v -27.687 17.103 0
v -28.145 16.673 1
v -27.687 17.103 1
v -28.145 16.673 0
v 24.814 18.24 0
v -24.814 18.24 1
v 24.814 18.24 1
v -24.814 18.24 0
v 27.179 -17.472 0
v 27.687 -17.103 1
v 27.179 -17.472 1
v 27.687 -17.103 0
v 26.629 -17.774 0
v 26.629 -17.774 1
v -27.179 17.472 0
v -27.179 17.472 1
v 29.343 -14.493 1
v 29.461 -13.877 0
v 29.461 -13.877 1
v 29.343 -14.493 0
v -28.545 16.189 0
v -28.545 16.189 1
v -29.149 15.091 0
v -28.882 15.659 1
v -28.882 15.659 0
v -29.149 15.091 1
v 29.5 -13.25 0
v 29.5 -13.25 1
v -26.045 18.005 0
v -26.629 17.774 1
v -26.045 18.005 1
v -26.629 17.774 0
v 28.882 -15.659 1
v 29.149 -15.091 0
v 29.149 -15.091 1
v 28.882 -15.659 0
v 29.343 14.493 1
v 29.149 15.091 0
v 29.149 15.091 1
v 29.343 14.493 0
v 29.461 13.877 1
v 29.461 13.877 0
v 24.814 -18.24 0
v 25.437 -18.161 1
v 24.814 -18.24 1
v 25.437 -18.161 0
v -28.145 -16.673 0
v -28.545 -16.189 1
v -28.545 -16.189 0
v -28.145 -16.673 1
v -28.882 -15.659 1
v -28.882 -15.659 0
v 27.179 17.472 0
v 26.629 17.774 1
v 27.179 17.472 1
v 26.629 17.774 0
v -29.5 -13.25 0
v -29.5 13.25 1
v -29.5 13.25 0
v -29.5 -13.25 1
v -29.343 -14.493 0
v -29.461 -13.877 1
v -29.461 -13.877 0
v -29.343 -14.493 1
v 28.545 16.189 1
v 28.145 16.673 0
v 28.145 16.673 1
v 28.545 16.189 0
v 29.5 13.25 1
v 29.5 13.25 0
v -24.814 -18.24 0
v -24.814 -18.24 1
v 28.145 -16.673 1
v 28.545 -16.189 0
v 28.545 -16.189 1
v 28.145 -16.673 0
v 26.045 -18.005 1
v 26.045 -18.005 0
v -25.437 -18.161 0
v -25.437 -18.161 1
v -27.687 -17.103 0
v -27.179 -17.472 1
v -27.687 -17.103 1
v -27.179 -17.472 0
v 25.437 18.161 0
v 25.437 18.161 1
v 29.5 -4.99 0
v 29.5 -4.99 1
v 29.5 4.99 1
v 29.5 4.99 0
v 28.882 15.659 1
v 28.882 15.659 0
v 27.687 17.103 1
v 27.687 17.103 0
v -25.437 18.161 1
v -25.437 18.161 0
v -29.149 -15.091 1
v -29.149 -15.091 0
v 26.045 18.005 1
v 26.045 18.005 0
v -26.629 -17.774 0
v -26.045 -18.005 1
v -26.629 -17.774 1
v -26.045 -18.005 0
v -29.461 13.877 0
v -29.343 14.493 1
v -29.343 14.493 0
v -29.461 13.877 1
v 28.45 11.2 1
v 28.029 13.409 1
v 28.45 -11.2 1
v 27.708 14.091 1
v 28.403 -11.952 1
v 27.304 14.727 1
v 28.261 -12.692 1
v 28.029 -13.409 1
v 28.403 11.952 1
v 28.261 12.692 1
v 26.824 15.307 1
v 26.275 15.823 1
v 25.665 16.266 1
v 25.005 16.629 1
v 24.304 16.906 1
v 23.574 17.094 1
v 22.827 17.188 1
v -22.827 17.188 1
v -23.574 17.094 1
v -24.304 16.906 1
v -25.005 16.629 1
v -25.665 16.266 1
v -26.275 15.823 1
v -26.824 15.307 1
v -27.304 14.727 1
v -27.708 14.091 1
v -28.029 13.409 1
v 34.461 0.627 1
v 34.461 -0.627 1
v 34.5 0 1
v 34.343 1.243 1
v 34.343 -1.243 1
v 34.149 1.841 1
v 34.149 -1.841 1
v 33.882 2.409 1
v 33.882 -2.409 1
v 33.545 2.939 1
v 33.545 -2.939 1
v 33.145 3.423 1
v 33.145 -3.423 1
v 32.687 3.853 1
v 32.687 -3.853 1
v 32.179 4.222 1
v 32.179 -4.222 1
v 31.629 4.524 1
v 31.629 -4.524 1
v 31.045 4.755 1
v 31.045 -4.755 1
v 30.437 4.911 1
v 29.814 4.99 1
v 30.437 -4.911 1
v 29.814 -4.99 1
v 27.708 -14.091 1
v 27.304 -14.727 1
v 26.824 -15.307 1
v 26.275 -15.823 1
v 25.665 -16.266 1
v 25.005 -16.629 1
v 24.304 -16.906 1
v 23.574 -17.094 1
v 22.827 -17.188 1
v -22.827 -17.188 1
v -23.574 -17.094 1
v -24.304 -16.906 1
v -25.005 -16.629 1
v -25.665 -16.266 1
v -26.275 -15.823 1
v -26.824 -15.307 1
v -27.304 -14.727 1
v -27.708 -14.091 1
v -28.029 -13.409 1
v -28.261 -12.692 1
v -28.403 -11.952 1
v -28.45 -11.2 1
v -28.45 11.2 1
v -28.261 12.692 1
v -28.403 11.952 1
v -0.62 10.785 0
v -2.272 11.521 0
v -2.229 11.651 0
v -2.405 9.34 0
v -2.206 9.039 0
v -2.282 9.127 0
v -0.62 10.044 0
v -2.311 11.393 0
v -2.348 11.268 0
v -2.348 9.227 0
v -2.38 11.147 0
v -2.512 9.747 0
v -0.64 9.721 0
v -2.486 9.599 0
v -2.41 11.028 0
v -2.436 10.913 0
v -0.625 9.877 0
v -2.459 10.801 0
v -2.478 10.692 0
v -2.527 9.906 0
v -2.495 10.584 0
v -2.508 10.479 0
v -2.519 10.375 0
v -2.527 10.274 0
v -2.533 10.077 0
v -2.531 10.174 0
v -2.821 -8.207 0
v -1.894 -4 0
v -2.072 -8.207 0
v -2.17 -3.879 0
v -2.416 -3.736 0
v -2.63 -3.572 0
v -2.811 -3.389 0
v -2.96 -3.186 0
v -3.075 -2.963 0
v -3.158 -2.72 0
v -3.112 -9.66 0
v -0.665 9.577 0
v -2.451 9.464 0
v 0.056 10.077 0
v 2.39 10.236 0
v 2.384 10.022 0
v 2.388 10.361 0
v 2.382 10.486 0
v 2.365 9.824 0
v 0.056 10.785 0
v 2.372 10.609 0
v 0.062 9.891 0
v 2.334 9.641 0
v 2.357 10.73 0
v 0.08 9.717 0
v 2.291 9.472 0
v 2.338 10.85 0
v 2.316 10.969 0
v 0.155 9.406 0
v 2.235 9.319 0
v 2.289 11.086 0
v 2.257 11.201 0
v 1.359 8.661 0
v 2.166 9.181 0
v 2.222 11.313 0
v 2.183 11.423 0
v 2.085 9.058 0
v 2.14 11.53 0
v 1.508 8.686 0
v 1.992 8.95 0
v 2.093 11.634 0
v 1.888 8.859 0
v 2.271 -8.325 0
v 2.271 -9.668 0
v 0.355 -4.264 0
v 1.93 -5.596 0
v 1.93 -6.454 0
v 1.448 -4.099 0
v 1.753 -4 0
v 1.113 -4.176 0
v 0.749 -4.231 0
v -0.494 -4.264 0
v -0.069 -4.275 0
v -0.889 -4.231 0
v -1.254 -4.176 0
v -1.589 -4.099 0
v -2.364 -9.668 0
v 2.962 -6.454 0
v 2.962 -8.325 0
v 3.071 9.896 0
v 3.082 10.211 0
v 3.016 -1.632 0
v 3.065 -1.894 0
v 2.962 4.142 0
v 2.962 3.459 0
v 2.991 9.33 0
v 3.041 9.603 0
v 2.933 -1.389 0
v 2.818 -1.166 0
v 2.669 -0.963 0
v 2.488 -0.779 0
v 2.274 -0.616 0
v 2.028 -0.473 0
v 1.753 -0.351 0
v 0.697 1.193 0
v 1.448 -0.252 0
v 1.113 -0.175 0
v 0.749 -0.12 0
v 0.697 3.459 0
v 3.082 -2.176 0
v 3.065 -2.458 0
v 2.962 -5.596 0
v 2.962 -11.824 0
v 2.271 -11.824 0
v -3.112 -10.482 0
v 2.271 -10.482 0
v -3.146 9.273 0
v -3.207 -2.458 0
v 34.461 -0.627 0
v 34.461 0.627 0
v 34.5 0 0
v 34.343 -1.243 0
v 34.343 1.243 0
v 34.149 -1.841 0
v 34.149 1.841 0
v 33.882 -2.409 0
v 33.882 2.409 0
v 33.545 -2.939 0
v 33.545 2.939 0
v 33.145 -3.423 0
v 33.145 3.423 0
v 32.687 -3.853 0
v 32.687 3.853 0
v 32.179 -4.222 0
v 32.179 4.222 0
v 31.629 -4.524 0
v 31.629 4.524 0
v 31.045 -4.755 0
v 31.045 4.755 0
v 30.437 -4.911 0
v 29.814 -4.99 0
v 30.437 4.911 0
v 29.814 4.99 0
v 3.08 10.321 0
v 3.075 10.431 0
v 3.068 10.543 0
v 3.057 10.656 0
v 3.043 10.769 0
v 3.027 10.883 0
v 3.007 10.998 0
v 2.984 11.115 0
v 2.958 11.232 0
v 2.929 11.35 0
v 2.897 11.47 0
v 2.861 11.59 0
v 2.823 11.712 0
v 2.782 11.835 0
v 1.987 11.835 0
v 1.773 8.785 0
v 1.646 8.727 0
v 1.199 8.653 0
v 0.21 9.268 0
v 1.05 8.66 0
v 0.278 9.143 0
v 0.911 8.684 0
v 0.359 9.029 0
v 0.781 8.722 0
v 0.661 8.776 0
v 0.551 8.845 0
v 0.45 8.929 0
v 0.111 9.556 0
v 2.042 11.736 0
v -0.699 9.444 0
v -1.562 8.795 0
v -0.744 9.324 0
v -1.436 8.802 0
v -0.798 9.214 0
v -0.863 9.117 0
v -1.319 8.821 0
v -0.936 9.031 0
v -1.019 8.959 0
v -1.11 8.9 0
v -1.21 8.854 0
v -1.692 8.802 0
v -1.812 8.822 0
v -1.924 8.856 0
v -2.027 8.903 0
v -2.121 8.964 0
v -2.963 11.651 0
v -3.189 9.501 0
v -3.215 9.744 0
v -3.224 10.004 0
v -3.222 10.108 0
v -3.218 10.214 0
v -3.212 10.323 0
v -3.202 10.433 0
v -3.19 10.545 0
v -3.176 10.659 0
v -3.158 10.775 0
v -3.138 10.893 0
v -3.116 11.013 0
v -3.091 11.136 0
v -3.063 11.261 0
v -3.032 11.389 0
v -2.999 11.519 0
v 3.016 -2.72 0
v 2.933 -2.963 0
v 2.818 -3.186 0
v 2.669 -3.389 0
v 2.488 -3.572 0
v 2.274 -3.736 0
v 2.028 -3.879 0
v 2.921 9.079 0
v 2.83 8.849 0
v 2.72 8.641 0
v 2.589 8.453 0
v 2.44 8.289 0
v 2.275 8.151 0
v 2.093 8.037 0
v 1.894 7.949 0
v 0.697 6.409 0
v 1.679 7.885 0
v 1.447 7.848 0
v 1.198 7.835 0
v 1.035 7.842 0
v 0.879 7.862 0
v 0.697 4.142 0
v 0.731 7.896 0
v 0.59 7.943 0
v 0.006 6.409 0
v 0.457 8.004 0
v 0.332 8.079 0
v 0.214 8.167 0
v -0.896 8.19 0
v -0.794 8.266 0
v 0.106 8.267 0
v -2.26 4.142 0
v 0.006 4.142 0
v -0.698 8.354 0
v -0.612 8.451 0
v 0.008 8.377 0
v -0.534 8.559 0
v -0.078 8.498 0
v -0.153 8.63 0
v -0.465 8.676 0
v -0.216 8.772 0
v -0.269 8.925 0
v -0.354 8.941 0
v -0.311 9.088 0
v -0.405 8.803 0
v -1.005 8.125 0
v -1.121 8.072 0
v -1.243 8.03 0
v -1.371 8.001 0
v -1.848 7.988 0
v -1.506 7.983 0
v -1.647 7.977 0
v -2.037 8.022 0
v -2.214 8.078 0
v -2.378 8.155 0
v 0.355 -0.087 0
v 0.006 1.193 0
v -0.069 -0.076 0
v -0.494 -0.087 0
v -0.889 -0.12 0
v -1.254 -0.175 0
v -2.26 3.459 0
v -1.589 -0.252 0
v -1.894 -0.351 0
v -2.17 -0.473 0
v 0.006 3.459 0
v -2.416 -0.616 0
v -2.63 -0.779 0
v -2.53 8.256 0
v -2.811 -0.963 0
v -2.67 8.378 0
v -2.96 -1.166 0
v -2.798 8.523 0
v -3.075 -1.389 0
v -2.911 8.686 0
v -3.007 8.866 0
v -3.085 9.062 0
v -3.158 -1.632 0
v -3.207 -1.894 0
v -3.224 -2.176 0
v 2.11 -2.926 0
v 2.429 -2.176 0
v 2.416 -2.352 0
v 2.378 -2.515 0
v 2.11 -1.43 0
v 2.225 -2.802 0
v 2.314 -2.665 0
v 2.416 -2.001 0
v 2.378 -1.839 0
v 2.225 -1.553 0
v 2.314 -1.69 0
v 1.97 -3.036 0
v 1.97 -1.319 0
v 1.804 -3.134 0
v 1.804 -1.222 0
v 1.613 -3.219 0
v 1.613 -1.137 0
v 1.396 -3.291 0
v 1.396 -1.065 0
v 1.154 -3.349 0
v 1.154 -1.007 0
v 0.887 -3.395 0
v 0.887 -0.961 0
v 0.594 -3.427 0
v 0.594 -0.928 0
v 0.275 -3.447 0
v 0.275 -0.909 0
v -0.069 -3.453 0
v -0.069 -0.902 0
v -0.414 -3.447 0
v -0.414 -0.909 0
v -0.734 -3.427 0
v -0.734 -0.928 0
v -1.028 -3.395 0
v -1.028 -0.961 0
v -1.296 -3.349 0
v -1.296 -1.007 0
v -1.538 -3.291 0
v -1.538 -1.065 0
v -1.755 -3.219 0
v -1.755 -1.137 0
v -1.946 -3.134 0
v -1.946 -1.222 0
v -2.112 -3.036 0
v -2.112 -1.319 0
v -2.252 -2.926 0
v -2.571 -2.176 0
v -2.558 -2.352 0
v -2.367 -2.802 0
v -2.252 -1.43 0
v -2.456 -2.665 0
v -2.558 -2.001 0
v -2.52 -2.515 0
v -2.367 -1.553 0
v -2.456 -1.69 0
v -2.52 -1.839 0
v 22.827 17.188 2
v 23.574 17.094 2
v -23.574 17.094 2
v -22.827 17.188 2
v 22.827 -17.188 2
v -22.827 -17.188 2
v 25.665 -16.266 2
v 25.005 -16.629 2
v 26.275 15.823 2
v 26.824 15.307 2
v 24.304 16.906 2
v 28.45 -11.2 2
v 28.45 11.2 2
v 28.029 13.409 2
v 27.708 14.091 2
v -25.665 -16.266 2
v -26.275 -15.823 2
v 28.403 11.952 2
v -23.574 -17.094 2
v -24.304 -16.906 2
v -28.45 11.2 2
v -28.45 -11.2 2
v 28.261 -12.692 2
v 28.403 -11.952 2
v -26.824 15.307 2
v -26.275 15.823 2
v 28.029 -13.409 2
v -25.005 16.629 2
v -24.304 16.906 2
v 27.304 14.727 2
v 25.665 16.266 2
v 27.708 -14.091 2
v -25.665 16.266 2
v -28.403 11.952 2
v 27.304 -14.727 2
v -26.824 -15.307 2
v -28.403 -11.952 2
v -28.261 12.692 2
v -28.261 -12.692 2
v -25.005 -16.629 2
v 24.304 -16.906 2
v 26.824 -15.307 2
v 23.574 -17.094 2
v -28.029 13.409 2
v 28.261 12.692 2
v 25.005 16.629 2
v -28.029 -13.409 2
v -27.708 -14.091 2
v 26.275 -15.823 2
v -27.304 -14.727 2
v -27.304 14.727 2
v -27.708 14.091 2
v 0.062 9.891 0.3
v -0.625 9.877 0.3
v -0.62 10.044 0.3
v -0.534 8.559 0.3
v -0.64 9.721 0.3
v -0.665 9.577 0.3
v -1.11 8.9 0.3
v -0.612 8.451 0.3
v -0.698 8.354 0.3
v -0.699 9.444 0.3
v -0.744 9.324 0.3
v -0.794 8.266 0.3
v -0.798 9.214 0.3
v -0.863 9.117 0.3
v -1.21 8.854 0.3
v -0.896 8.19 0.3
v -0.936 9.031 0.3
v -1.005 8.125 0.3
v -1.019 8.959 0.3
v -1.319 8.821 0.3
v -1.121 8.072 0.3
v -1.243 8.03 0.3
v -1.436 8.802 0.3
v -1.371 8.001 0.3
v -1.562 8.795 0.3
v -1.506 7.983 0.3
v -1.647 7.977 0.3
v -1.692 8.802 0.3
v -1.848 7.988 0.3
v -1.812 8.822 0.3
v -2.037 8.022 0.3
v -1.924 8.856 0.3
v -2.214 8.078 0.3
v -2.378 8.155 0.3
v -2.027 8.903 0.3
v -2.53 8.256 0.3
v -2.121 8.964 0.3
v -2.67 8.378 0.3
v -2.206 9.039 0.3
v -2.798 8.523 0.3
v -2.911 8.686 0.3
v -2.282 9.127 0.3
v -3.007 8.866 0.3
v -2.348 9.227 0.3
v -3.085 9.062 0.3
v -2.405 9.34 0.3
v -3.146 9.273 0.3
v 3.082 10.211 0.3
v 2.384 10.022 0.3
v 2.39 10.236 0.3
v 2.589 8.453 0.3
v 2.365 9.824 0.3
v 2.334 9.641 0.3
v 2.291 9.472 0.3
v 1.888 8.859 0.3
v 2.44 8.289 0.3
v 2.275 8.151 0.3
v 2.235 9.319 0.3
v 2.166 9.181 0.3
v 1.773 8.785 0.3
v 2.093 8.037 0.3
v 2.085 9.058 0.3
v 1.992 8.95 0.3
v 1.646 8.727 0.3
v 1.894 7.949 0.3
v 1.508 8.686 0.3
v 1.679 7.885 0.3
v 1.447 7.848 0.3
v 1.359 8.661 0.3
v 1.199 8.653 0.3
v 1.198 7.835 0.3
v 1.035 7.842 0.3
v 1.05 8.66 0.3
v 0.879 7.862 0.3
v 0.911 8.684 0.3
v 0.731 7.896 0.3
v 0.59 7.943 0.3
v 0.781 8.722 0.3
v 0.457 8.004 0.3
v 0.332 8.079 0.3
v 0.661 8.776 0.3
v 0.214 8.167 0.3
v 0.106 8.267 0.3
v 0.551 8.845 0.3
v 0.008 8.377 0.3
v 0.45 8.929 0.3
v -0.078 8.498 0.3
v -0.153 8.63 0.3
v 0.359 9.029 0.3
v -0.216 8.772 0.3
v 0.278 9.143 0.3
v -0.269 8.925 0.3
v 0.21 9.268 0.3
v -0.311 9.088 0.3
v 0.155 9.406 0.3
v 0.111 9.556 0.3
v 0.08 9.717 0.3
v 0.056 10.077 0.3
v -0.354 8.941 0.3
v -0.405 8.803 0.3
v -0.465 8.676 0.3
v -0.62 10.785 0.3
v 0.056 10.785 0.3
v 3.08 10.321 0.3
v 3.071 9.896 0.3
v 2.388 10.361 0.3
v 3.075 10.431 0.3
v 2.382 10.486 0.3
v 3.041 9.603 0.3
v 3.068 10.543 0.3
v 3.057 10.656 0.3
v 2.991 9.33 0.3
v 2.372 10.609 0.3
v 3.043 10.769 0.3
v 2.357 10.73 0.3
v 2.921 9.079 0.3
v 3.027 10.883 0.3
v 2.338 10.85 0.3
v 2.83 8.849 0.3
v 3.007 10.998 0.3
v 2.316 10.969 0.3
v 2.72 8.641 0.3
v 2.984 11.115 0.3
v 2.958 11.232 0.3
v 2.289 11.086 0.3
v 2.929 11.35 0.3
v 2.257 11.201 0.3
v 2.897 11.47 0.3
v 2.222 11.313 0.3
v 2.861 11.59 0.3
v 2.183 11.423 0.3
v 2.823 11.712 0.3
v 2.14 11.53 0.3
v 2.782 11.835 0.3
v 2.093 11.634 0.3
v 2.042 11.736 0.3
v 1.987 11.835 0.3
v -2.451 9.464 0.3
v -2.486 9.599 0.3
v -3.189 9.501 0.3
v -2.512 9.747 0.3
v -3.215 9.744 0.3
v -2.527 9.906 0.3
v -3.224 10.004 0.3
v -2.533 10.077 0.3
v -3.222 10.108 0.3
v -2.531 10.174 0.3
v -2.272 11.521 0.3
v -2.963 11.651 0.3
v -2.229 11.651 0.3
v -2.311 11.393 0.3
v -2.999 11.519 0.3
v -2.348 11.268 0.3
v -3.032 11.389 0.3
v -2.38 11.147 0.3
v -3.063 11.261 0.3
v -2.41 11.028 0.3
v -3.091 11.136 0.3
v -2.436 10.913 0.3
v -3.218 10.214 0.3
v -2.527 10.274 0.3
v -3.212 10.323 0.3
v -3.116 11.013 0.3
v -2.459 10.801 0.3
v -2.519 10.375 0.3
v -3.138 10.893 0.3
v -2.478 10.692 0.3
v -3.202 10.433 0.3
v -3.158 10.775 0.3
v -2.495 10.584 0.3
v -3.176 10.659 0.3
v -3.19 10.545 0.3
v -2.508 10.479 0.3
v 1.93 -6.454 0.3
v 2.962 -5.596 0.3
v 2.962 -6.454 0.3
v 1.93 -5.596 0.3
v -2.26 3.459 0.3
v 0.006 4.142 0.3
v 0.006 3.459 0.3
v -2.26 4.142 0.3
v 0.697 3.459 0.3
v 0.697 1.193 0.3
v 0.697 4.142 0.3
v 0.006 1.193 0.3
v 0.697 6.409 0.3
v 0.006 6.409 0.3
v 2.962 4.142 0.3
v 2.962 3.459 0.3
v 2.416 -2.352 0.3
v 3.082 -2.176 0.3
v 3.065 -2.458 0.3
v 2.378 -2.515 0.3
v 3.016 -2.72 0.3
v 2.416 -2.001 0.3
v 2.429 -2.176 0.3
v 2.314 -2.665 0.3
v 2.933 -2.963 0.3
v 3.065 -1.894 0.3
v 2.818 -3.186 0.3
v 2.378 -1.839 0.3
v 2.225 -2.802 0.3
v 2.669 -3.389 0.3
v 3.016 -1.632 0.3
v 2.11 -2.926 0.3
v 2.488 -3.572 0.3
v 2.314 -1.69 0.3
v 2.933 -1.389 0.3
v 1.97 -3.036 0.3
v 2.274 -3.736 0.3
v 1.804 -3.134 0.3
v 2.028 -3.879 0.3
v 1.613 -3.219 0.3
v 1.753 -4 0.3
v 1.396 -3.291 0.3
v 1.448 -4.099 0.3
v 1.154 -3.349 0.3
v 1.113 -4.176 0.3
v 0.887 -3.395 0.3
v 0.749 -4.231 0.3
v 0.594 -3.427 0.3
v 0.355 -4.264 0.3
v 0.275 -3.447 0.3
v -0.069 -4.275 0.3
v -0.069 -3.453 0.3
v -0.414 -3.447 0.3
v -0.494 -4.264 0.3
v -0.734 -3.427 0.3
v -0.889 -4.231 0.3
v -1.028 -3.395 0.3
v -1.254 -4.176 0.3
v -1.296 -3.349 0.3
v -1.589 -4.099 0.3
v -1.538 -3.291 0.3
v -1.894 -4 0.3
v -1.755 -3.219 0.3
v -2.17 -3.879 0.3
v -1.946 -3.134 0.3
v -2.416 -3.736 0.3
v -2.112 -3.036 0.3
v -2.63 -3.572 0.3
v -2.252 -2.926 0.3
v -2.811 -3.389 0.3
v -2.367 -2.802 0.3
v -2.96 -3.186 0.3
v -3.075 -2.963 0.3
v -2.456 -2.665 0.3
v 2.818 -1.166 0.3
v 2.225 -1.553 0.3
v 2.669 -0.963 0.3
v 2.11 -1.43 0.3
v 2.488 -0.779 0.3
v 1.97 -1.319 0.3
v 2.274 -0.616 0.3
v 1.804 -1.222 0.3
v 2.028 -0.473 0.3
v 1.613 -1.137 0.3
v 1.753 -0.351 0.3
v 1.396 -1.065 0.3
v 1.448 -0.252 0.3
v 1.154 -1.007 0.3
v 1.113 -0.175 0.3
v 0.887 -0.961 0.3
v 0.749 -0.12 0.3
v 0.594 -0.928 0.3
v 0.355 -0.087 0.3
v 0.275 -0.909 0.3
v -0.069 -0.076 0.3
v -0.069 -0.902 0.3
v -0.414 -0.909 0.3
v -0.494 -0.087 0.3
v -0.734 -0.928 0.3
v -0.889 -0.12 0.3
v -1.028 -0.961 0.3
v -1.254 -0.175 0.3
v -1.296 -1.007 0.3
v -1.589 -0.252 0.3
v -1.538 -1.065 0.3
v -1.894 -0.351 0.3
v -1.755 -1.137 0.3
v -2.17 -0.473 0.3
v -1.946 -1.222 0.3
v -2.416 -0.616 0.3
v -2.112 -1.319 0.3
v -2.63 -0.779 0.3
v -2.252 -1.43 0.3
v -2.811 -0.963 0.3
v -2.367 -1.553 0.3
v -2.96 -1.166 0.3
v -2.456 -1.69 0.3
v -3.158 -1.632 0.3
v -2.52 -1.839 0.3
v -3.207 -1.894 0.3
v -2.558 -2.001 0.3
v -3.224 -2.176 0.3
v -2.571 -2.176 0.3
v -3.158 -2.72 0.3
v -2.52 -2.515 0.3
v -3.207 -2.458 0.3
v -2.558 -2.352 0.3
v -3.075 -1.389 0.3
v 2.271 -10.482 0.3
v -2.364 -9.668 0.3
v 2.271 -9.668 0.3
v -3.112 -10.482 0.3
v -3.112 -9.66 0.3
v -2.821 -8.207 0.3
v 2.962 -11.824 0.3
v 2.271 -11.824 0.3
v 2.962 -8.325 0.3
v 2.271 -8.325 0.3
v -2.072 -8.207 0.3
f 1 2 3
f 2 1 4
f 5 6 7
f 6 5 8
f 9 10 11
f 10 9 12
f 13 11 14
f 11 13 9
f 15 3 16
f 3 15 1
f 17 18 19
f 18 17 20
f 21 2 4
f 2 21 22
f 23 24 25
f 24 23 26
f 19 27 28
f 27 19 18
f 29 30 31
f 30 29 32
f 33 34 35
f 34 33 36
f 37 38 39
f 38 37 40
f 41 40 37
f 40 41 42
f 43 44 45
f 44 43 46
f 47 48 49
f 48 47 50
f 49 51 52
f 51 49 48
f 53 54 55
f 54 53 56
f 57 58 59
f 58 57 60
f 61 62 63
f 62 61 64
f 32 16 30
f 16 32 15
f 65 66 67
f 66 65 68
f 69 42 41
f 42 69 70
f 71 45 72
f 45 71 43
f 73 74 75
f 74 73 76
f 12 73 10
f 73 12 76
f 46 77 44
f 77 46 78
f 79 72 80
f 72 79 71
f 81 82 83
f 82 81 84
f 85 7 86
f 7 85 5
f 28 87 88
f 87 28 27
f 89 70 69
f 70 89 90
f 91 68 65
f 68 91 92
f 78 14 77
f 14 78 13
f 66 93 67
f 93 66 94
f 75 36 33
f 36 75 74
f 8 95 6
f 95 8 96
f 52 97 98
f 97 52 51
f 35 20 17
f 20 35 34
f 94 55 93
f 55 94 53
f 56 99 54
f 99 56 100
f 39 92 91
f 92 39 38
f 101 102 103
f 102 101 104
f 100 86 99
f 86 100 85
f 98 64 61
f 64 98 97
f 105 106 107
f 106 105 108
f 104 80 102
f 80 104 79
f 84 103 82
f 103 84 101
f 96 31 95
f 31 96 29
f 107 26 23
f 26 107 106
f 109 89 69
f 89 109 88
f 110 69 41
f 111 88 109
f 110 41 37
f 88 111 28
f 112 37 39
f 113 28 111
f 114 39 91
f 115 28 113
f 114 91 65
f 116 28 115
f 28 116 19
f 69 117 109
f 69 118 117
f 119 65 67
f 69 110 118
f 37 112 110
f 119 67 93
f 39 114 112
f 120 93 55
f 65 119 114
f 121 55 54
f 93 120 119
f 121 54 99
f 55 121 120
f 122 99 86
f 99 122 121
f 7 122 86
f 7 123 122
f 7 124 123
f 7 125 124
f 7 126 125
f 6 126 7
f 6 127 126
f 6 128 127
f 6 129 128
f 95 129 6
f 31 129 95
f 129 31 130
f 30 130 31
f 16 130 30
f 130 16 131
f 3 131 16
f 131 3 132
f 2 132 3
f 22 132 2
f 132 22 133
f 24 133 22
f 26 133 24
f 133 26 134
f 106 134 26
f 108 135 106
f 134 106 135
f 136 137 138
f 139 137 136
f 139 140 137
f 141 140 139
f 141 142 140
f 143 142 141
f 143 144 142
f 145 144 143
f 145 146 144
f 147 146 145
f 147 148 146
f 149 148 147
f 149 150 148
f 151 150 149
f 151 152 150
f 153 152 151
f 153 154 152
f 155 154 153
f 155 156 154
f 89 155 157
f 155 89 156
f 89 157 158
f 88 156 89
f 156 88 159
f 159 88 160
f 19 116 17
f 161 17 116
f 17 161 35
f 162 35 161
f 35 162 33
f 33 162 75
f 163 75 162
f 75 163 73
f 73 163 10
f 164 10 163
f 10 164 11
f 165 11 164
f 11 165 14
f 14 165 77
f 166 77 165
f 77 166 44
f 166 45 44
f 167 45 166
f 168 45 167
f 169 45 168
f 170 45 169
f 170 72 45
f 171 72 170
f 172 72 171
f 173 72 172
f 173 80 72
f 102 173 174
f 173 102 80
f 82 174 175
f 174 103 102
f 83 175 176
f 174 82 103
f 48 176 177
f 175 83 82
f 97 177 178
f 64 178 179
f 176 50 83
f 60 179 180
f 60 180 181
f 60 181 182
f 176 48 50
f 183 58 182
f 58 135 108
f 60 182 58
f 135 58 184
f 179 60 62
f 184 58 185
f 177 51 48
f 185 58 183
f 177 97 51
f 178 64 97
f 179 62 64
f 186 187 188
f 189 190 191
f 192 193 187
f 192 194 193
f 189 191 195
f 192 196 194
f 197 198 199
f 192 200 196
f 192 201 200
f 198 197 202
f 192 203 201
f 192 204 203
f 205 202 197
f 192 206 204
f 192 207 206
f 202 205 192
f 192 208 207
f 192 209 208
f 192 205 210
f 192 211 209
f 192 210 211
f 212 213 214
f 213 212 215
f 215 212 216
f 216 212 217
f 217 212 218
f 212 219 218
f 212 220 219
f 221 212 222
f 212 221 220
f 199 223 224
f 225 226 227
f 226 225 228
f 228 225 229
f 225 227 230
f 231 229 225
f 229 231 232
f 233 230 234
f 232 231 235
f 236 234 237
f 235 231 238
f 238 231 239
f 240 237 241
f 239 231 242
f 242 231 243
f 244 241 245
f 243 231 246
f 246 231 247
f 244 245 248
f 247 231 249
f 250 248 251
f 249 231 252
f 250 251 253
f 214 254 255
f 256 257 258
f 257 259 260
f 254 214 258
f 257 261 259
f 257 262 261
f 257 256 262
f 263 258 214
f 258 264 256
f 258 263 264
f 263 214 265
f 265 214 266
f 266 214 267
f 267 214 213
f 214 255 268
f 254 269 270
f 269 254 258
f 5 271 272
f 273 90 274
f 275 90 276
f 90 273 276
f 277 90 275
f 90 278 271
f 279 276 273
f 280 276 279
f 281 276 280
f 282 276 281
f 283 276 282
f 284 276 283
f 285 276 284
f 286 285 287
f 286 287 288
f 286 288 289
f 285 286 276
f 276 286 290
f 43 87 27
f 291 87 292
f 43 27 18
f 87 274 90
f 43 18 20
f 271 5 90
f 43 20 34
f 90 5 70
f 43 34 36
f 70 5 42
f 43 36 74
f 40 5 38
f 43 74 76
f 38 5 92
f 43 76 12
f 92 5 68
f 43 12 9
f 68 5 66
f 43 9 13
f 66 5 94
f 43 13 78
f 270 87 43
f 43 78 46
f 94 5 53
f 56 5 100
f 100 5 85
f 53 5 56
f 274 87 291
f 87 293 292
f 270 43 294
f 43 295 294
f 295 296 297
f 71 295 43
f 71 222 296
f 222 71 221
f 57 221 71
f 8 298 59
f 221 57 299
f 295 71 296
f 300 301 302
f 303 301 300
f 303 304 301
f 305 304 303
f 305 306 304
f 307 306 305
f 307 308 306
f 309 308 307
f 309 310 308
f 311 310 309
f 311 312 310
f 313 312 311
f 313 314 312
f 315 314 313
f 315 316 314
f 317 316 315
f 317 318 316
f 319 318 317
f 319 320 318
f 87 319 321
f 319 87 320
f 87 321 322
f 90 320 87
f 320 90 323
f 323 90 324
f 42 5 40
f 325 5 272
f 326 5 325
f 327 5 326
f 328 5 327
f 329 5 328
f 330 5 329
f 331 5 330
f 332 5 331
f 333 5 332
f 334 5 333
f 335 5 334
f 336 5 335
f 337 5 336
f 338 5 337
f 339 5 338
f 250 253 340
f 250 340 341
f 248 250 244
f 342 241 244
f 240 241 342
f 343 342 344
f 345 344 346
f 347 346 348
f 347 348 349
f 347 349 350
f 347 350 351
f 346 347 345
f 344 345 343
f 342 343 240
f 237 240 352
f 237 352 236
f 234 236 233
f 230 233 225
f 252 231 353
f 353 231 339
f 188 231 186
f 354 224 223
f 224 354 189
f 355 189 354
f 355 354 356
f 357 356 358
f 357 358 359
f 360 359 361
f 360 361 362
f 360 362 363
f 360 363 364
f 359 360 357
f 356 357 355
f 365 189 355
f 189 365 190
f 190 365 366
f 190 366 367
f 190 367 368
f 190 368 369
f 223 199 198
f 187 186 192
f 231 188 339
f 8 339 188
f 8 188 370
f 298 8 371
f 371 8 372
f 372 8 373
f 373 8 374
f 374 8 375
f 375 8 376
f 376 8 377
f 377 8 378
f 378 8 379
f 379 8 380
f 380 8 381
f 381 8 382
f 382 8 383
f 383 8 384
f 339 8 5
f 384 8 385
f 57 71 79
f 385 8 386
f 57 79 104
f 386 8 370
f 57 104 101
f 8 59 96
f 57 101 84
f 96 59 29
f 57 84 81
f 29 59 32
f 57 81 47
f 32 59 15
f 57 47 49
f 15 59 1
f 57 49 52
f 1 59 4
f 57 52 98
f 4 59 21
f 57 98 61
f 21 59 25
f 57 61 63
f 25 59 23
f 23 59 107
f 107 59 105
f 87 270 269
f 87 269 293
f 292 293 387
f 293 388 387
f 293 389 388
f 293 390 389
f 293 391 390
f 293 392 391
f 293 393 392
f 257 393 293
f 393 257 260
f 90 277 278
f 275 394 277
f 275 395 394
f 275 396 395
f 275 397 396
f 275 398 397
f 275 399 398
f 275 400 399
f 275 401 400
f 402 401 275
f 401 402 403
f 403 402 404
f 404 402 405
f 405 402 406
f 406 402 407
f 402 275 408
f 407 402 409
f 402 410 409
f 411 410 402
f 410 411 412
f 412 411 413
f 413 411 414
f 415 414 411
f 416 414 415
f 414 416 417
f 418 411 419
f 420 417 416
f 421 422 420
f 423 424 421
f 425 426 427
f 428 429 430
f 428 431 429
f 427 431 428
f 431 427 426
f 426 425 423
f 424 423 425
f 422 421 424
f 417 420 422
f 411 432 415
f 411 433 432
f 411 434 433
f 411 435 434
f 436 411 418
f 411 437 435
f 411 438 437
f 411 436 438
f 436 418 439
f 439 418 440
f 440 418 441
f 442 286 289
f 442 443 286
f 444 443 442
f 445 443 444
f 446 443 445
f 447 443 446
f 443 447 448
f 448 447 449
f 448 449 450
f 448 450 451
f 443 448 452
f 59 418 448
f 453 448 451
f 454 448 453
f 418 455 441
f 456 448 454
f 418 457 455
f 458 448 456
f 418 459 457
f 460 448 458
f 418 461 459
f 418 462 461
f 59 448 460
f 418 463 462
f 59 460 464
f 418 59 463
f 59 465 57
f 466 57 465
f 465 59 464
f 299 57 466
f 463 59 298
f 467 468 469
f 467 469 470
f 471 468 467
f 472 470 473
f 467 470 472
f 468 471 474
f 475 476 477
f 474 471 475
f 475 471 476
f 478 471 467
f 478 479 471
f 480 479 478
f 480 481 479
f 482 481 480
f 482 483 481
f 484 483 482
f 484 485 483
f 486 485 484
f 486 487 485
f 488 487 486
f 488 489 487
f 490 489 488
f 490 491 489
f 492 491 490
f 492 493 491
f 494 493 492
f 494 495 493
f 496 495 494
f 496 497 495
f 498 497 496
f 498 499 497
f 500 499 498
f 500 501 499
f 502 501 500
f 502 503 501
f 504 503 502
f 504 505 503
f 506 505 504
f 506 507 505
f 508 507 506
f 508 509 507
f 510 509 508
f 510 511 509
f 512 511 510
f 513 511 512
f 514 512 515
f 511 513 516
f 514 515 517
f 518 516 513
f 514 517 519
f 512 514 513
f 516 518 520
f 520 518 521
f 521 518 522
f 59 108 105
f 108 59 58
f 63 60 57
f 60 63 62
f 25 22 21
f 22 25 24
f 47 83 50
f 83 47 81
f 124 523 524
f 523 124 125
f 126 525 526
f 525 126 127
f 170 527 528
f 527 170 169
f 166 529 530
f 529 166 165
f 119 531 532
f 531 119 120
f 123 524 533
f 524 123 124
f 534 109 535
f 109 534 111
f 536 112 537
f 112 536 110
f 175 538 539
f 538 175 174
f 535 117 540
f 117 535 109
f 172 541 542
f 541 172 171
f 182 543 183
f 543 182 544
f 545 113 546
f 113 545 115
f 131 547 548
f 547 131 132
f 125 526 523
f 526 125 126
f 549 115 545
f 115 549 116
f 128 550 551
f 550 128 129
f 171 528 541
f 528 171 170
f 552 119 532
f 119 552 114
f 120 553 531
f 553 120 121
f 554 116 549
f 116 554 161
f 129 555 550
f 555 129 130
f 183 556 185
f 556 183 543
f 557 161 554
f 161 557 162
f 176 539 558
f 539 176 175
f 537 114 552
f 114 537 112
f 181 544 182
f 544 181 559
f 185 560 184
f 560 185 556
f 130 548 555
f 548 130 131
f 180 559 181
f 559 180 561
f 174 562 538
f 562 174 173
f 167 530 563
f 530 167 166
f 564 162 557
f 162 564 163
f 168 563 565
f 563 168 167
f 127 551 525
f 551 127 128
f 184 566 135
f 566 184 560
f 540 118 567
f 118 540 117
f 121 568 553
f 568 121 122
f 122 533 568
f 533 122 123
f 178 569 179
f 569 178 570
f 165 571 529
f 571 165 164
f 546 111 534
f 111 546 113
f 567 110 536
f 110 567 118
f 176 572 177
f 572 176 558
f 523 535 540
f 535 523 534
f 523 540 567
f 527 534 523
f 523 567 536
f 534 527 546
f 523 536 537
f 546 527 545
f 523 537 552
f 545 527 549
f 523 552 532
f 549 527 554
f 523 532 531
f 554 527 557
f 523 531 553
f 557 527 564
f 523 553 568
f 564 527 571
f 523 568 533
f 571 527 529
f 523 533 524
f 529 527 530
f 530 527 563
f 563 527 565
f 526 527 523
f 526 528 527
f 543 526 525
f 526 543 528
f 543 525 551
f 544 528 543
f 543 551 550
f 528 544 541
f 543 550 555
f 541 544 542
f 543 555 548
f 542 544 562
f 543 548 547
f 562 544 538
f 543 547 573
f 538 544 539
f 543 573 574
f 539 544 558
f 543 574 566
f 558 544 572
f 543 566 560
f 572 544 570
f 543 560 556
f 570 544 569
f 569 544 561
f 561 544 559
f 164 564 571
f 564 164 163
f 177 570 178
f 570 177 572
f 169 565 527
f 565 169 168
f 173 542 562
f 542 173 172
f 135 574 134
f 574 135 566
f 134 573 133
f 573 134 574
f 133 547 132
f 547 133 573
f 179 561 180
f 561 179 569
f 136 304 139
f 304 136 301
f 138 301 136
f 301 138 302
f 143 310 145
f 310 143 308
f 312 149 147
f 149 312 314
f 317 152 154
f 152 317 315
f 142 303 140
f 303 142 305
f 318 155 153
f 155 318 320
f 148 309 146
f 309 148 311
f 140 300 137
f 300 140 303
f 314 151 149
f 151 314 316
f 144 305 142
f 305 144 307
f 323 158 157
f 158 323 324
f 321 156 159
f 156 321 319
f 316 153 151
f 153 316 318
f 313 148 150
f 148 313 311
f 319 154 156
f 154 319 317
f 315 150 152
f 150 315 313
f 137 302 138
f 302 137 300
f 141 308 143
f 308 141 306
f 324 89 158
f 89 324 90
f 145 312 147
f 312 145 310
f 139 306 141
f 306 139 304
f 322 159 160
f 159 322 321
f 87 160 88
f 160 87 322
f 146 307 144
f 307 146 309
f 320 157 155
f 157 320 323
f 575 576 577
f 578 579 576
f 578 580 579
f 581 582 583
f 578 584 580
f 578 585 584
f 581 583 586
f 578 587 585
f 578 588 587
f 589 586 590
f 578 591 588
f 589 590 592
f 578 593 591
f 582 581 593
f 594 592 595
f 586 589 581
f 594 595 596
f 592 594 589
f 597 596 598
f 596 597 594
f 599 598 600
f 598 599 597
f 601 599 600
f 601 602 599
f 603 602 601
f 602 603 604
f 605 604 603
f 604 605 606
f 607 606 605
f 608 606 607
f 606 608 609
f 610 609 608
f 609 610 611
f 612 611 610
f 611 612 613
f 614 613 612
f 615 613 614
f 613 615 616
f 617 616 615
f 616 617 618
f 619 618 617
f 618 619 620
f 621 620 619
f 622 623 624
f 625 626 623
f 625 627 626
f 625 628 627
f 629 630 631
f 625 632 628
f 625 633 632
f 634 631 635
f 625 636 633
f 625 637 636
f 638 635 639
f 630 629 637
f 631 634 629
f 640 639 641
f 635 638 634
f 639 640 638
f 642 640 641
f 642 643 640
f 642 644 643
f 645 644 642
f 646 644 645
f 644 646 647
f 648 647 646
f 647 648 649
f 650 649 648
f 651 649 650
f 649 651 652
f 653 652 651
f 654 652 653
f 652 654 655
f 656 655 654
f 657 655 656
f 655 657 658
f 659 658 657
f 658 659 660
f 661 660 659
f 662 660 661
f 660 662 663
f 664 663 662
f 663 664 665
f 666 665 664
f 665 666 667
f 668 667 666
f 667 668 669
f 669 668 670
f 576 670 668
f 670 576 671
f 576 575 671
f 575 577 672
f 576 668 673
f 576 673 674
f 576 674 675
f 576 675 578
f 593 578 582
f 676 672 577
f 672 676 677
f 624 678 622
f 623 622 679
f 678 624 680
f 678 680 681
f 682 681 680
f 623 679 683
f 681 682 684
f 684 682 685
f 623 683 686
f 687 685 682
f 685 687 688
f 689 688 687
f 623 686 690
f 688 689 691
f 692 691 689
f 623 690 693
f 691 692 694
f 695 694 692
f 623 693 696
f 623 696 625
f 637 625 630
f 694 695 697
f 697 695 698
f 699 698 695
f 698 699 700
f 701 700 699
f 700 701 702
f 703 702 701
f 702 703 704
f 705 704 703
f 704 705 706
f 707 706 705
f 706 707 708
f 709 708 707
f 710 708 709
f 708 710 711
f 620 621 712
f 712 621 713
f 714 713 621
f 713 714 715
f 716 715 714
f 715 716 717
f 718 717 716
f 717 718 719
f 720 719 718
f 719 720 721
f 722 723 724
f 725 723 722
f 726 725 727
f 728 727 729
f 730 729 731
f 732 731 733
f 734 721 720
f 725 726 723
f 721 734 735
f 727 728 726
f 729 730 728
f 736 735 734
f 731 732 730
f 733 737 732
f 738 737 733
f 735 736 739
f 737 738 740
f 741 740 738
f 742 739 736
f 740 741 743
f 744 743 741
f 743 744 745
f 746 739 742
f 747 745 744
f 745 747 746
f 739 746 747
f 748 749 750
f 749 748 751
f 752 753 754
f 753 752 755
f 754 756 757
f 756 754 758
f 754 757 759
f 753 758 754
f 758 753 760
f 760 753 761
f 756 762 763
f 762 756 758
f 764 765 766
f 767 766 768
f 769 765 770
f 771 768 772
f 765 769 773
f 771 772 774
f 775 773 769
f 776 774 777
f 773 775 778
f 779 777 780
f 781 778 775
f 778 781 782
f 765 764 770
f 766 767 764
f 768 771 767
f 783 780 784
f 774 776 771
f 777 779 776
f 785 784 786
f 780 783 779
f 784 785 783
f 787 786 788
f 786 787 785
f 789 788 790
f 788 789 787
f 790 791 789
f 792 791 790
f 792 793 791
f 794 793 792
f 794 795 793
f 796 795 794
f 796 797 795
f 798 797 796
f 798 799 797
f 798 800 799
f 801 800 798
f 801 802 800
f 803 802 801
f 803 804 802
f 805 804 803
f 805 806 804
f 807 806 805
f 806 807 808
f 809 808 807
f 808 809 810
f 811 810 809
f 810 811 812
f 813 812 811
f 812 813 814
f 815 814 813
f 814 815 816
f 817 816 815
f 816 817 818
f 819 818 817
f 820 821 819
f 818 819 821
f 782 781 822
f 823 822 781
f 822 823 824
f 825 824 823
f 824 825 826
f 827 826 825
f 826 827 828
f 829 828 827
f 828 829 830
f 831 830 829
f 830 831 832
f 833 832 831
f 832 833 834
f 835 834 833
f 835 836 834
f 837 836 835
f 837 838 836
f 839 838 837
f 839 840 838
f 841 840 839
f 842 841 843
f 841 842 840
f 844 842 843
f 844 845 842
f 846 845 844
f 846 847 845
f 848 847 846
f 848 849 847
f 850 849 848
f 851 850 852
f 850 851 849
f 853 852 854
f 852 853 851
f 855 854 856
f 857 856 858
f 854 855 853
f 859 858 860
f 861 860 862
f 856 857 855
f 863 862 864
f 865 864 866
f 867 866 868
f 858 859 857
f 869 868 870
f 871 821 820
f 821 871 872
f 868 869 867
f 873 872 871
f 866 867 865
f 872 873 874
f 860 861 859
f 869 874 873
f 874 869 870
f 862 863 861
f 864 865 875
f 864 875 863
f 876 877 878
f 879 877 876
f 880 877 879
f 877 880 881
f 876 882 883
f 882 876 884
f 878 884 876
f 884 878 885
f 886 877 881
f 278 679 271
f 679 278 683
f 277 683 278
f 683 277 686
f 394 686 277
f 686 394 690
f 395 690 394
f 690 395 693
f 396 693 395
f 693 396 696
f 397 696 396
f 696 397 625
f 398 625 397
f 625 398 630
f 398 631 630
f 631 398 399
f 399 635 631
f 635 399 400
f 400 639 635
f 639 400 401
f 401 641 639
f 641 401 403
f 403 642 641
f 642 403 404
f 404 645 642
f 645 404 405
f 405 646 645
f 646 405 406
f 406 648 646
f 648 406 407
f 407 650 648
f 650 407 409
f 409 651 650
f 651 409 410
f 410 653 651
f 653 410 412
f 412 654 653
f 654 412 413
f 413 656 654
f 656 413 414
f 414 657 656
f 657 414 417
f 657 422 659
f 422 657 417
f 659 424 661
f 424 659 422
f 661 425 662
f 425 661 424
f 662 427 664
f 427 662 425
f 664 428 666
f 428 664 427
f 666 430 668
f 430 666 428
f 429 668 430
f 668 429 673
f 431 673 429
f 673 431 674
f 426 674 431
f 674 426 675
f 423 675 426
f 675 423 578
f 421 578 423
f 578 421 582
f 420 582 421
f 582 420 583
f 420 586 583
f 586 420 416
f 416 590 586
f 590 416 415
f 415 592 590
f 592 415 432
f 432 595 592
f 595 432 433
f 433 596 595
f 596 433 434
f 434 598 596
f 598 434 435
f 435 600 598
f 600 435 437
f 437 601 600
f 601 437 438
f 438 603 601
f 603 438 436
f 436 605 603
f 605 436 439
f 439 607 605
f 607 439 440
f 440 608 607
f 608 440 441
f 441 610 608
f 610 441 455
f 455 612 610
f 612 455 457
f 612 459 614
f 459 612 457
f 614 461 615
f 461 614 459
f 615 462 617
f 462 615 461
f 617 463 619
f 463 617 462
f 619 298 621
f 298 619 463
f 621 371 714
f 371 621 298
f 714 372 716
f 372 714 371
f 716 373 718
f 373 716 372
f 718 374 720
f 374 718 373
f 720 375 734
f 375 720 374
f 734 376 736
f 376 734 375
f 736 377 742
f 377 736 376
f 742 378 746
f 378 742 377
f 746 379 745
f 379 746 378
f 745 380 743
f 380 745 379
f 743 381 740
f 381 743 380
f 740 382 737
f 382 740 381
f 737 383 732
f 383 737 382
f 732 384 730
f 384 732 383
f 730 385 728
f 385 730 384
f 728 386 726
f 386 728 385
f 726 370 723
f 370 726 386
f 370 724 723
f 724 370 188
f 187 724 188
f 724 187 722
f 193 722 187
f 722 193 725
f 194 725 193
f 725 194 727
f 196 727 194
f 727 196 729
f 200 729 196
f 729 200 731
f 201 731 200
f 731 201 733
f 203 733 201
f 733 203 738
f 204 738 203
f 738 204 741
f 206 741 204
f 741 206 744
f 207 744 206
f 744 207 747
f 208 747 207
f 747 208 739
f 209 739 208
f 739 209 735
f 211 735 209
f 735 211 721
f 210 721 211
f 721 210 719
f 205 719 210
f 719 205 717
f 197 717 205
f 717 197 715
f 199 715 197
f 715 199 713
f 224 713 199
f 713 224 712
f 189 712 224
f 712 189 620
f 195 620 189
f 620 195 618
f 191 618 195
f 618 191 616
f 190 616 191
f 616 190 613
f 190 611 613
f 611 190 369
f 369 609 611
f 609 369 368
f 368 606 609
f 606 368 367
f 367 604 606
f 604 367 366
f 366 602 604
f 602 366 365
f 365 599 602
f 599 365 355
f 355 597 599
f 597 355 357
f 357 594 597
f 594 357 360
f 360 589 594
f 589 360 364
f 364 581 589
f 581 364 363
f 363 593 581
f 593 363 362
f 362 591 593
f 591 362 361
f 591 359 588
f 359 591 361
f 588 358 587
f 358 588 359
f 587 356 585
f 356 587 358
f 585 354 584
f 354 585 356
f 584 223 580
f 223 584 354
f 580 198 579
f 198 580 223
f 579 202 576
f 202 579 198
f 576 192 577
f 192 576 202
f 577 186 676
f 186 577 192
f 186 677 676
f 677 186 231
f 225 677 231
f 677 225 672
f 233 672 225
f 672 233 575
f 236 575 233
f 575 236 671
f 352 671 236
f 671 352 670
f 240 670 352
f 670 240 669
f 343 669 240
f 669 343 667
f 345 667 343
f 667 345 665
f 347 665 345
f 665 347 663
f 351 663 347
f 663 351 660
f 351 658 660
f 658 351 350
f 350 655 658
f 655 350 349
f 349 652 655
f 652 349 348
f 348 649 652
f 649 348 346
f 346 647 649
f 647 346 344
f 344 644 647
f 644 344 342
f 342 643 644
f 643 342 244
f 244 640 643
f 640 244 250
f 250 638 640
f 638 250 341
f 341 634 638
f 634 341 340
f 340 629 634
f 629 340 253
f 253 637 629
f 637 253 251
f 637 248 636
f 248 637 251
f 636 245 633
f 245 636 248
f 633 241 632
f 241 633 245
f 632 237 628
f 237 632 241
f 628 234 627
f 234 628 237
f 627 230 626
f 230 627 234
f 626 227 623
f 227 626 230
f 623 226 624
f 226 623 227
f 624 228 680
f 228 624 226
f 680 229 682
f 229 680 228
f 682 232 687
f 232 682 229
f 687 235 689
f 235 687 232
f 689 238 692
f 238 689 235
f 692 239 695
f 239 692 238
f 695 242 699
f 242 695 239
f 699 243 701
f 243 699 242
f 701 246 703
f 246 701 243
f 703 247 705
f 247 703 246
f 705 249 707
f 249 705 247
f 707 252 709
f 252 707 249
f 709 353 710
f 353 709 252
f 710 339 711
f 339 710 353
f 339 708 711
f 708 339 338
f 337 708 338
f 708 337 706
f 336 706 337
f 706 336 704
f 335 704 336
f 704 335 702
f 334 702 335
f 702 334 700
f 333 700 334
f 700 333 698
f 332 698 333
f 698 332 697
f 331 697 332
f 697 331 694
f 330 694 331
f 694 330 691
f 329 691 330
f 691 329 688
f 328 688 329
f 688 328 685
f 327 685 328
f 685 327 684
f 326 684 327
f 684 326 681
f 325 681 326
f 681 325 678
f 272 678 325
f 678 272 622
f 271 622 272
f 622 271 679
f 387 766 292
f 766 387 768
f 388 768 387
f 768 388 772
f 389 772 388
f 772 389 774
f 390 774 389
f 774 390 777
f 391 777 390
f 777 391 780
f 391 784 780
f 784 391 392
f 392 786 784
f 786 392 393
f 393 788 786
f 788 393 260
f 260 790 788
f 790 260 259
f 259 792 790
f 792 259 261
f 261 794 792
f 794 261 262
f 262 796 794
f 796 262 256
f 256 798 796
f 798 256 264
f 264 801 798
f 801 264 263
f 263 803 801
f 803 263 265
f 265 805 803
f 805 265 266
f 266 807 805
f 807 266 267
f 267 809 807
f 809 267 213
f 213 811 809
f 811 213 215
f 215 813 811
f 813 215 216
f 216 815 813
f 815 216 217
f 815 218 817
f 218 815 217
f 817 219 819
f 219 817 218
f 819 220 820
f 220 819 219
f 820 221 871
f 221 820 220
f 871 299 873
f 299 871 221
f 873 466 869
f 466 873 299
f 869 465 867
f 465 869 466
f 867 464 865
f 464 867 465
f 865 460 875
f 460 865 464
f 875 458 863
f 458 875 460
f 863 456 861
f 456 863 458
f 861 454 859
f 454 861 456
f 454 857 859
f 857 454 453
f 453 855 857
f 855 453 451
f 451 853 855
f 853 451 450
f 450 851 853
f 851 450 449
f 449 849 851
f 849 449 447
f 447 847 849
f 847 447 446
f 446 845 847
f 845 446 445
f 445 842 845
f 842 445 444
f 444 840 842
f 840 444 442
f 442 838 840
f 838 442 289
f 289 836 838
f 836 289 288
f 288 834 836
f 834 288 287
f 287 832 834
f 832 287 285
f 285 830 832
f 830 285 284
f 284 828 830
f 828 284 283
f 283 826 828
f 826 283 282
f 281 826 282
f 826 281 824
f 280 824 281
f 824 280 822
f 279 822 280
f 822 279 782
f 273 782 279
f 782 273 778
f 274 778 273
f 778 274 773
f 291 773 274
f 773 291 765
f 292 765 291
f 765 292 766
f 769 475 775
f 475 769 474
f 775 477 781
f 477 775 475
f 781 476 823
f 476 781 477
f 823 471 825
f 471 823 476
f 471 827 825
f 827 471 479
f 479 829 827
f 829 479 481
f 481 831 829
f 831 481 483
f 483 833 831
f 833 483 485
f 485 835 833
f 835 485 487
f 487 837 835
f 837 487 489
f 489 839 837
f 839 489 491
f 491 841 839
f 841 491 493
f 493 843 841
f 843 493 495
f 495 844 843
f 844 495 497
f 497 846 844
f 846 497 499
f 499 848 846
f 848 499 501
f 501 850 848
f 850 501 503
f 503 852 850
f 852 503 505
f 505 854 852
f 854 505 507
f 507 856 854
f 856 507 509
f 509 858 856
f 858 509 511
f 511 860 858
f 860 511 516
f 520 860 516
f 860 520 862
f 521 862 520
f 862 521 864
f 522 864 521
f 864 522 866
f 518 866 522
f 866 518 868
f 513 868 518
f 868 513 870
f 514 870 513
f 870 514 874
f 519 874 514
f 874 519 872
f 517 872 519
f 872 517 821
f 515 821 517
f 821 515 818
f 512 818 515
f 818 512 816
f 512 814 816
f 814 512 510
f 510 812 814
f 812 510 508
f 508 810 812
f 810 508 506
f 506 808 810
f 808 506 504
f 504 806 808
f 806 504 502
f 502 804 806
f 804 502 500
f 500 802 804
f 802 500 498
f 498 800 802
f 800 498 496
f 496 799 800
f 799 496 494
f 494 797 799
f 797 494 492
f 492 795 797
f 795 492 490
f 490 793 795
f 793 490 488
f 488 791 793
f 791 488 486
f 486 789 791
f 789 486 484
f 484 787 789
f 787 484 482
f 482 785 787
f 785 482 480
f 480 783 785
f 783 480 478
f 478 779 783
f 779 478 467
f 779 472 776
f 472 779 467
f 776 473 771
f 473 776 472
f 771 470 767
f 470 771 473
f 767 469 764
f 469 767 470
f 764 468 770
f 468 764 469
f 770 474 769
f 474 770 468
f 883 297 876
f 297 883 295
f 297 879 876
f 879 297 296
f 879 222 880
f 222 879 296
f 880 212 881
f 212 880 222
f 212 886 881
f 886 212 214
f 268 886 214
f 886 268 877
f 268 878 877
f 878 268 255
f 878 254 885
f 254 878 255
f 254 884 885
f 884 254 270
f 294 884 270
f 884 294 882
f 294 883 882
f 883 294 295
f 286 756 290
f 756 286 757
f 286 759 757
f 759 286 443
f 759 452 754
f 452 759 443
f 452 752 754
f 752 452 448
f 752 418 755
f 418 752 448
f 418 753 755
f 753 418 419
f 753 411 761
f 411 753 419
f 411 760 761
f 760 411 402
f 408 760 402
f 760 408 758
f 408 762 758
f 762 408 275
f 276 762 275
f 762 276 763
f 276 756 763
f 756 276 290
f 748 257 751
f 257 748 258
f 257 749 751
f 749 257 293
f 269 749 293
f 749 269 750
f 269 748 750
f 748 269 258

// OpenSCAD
$fn = 50;


difference() {
	union() {
		translate(v = [0, 0, 0]) {
			rotate(a = [0, 0, 0]) {
				hull() {
					translate(v = [-24.5000000000, 13.2500000000, 0]) {
						rotate(a = [0, 0, 0]) {
							translate(v = [0, 0, 0]) {
								rotate(a = [0, 0, 0]) {
									cylinder(h = 1, r = 5);
								}
							}
						}
					}
					translate(v = [24.5000000000, 13.2500000000, 0]) {
						rotate(a = [0, 0, 0]) {
							translate(v = [0, 0, 0]) {
								rotate(a = [0, 0, 0]) {
									cylinder(h = 1, r = 5);
								}
							}
						}
					}
					translate(v = [-24.5000000000, -13.2500000000, 0]) {
						rotate(a = [0, 0, 0]) {
							translate(v = [0, 0, 0]) {
								rotate(a = [0, 0, 0]) {
									cylinder(h = 1, r = 5);
								}
							}
						}
					}
					translate(v = [24.5000000000, -13.2500000000, 0]) {
						rotate(a = [0, 0, 0]) {
							translate(v = [0, 0, 0]) {
								rotate(a = [0, 0, 0]) {
									cylinder(h = 1, r = 5);
								}
							}
						}
					}
				}
			}
		}
		translate(v = [0, 0, 0]) {
			rotate(a = [0, 0, 0]) {
				hull() {
					translate(v = [-22.4500000000, 11.2000000000, 0]) {
						rotate(a = [0, 0, 0]) {
							translate(v = [0, 0, 0]) {
								rotate(a = [0, 0, 0]) {
									cylinder(h = 2, r = 6);
								}
							}
						}
					}
					translate(v = [22.4500000000, 11.2000000000, 0]) {
						rotate(a = [0, 0, 0]) {
							translate(v = [0, 0, 0]) {
								rotate(a = [0, 0, 0]) {
									cylinder(h = 2, r = 6);
								}
							}
						}
					}
					translate(v = [-22.4500000000, -11.2000000000, 0]) {
						rotate(a = [0, 0, 0]) {
							translate(v = [0, 0, 0]) {
								rotate(a = [0, 0, 0]) {
									cylinder(h = 2, r = 6);
								}
							}
						}
					}
					translate(v = [22.4500000000, -11.2000000000, 0]) {
						rotate(a = [0, 0, 0]) {
							translate(v = [0, 0, 0]) {
								rotate(a = [0, 0, 0]) {
									cylinder(h = 2, r = 6);
								}
							}
						}
					}
				}
			}
		}
		translate(v = [29.5000000000, 0, 0.0000000000]) {
			rotate(a = [0, 0, 0]) {
				cylinder(h = 1, r = 5);
			}
		}
	}
	union() {
		translate(v = [0, 0, 0.3000000000]) {
			rotate(a = [0, 180, 90]) {
				linear_extrude(height = 0.3000000000) {
					text(font = "Candara:Light", halign = "center", size = 6, text = "3+0.1", valign = "center");
				}
			}
		}
	}
}
